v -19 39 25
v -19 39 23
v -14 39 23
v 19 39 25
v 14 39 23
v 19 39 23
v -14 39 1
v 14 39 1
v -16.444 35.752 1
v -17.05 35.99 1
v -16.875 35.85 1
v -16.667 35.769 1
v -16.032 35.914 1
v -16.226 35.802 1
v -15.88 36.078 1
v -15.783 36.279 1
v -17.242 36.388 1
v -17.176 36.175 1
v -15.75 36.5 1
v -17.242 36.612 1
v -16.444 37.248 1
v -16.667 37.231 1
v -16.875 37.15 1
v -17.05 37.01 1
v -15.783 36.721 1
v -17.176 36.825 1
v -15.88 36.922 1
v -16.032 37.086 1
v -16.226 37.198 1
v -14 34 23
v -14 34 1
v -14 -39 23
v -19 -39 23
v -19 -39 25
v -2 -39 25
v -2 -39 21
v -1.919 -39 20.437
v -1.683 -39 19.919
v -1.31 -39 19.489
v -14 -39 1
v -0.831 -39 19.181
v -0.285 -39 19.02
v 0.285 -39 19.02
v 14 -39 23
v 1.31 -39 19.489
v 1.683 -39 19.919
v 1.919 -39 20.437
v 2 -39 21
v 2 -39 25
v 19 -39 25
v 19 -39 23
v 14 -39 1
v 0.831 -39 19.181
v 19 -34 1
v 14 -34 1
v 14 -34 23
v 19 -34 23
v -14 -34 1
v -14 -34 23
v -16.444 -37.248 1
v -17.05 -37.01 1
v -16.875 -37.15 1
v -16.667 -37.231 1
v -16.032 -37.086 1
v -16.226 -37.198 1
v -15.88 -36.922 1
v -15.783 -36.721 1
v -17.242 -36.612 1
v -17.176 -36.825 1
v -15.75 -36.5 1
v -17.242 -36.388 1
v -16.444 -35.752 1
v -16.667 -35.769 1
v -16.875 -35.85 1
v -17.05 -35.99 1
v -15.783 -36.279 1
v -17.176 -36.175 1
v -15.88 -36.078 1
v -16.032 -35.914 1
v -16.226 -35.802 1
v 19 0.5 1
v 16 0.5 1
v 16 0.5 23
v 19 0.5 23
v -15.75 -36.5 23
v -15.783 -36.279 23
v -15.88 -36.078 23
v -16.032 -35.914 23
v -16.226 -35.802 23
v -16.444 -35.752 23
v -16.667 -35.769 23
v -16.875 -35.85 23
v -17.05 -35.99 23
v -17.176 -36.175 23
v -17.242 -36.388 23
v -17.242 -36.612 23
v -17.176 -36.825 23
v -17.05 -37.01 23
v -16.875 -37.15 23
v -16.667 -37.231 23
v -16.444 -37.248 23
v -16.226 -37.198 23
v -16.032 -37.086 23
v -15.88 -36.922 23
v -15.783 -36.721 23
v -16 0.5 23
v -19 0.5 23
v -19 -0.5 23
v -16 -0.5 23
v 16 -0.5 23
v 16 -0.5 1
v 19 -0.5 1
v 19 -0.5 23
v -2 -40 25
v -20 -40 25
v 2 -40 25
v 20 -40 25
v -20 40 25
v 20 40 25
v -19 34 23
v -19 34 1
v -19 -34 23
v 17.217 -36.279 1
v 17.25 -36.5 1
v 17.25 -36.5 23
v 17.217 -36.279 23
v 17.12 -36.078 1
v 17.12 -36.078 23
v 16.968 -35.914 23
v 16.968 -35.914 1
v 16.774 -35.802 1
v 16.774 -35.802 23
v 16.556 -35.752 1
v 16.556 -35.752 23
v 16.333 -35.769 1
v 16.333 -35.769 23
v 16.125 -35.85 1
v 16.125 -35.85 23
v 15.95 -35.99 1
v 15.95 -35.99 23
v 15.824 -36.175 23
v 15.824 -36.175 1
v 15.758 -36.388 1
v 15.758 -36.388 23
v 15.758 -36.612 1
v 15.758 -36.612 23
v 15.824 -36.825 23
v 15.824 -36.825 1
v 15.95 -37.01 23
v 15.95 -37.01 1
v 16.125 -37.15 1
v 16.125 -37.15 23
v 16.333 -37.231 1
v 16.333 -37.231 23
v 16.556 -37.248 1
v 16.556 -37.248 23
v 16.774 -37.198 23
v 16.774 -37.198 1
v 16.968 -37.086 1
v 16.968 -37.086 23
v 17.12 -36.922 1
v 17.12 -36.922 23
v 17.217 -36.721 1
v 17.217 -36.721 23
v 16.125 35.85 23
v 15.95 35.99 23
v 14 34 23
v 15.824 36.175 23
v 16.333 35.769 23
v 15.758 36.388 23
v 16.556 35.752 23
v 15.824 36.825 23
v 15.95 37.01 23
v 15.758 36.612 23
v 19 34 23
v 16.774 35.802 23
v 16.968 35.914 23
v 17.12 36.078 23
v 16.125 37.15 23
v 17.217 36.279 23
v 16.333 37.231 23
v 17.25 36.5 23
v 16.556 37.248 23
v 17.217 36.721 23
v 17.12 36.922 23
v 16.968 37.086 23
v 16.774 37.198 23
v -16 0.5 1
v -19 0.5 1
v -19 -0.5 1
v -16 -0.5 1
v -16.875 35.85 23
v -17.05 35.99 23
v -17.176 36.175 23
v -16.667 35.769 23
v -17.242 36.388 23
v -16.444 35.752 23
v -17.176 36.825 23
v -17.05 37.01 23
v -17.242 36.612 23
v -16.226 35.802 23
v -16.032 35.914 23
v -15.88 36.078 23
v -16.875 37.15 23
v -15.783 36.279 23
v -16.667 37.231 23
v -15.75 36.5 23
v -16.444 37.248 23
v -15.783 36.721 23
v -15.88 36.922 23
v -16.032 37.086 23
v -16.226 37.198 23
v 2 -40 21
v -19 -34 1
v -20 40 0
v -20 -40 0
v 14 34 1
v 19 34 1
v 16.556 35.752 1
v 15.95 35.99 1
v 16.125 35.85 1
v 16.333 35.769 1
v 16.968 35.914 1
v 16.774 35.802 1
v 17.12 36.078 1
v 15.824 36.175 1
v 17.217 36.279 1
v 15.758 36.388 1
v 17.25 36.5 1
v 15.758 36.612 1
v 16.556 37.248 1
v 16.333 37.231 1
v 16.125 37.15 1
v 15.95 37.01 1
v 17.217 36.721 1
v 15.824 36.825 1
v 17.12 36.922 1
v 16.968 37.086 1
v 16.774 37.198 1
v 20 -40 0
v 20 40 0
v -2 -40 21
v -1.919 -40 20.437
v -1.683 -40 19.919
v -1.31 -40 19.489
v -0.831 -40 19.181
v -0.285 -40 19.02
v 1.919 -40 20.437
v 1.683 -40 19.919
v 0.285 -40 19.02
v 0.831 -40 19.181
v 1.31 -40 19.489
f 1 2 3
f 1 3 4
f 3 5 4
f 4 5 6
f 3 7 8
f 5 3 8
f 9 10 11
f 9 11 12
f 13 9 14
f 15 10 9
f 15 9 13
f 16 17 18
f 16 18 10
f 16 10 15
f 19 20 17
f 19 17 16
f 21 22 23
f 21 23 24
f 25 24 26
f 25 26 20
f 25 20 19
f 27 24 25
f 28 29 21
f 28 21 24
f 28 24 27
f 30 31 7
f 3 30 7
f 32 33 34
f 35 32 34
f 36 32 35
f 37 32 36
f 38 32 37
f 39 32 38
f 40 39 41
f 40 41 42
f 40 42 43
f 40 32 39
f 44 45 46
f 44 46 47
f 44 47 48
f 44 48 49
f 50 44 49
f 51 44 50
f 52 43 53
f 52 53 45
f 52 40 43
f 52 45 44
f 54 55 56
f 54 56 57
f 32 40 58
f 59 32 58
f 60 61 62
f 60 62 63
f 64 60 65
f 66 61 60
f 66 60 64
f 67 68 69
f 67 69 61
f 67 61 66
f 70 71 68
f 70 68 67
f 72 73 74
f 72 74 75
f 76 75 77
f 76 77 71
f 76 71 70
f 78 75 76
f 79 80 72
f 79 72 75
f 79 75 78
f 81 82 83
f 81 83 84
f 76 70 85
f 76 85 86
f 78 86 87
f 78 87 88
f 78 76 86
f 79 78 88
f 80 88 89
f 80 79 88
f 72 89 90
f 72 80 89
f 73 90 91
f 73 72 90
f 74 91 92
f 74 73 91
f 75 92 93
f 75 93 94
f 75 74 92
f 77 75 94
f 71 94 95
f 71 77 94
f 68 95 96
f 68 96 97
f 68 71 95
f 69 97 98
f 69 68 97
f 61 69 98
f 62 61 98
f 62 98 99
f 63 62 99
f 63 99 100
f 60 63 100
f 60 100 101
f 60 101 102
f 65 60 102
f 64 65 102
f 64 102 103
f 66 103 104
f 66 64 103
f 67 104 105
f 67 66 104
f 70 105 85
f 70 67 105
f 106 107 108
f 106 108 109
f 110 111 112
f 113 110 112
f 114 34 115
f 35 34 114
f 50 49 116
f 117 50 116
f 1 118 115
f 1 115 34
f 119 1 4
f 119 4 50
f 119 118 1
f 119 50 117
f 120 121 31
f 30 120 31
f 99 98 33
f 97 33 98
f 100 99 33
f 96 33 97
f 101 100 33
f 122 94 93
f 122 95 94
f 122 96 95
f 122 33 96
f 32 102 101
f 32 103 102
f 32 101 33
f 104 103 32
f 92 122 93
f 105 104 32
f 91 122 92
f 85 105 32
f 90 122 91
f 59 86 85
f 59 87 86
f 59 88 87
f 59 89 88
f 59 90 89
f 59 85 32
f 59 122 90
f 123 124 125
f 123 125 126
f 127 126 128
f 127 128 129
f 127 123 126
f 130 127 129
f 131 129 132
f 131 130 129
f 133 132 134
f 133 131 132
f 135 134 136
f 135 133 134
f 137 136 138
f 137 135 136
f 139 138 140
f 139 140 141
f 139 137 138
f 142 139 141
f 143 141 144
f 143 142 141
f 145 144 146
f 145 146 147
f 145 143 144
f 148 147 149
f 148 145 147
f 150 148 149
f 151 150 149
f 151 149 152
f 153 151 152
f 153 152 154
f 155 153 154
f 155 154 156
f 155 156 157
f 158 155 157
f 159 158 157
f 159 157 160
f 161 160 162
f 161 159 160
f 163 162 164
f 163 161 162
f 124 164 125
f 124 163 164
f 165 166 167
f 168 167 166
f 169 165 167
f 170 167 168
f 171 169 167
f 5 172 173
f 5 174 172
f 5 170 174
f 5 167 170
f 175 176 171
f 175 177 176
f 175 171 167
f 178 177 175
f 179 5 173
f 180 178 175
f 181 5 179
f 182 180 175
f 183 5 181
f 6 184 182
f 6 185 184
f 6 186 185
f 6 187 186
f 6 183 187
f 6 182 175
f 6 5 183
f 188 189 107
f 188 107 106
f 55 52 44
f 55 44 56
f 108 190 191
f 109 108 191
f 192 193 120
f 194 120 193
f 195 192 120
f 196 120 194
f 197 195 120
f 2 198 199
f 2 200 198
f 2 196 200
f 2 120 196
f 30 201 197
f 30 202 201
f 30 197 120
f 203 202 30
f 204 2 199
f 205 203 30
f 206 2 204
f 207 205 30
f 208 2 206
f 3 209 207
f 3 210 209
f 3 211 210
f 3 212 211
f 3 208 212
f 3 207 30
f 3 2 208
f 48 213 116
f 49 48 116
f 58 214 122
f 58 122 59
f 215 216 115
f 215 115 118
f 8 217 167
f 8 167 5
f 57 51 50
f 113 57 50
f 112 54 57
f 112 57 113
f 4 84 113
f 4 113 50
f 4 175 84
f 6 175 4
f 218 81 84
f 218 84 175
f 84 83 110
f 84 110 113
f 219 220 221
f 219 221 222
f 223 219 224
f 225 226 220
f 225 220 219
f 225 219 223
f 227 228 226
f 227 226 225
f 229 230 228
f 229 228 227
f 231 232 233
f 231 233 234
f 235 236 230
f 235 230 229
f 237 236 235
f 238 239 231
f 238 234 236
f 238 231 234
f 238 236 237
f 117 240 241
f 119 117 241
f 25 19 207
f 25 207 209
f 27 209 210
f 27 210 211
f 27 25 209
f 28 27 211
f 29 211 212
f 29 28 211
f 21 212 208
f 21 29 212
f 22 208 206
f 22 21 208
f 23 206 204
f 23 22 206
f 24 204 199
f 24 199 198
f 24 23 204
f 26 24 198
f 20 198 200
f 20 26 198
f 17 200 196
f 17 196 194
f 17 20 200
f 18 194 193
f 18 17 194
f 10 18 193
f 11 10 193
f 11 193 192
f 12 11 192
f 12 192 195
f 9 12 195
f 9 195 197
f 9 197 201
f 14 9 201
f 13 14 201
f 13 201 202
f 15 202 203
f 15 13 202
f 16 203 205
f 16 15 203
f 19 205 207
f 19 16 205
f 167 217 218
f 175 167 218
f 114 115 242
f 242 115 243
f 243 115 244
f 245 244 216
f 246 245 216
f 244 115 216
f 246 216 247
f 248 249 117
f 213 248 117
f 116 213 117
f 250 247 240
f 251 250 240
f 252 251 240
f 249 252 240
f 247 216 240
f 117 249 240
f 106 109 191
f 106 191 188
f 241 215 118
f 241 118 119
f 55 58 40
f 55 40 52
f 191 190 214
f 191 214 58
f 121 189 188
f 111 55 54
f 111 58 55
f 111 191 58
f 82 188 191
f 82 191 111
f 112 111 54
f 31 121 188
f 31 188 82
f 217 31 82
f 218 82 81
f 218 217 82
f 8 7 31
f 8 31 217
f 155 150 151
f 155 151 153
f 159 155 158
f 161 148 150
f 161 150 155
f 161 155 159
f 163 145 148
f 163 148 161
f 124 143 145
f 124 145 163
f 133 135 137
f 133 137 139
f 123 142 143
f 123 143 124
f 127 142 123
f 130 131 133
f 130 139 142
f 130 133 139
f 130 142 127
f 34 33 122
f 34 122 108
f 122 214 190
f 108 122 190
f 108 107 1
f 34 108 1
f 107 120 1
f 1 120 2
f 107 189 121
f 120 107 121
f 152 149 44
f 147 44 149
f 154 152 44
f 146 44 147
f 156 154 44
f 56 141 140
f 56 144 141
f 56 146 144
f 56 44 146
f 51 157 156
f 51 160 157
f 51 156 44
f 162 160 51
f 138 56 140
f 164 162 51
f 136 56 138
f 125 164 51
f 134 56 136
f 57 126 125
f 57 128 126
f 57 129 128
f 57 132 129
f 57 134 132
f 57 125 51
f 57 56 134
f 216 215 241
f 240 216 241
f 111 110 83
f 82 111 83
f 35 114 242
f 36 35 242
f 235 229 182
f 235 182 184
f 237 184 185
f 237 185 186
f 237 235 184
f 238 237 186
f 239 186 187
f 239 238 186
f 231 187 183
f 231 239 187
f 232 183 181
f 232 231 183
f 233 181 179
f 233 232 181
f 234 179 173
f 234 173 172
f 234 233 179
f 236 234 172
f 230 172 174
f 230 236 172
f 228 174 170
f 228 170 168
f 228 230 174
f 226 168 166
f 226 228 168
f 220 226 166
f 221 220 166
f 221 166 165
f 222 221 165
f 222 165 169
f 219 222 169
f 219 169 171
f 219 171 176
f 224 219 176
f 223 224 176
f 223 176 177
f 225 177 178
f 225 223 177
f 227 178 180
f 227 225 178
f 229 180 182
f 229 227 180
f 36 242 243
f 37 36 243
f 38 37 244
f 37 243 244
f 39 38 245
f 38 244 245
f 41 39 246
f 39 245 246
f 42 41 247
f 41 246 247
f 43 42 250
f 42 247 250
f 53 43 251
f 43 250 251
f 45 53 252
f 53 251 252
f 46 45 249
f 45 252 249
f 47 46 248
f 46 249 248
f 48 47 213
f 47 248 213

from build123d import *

# Parameters (mm, degrees)
F0_W     = 40
F0_H     = 80
F1_DEPTH = 25
F2_T     = -1
F3_W     = 5
F3_H     = 5
F3_R     = 0.75
F3_W_2   = 3
F3_H_2   = 1
F4_DEPTH = 22
F6_DEPTH = 25


with BuildPart() as f1:
    # F0 (on Top) → F1 (new body)
    with BuildSketch(Plane.XY):
        Rectangle(F0_W, F0_H)
    extrude(amount=F1_DEPTH)

    # F2
    f2_openings = [f1.faces().sort_by_distance(p)[0] for p in [
        (0, 0, 25),
    ]]
    offset(amount=F2_T, openings=f2_openings)

    # F3 (on face) → F4 (join)
    with BuildSketch(Plane.XY.offset(1)):
        with Locations((-16.5, 36.5)):
            Rectangle(F3_W, F3_H)
        with Locations((-16.5, 36.5)):
            Circle(F3_R, mode=Mode.SUBTRACT)
        with Locations((-16.5, -36.5)):
            Rectangle(F3_W, F3_H)
        with Locations((-16.5, -36.5)):
            Circle(F3_R, mode=Mode.SUBTRACT)
        with Locations((16.5, 36.5)):
            Rectangle(F3_W, F3_H)
        with Locations((16.5, 36.5)):
            Circle(F3_R, mode=Mode.SUBTRACT)
        with Locations((16.5, -36.5)):
            Rectangle(F3_W, F3_H)
        with Locations((16.5, -36.5)):
            Circle(F3_R, mode=Mode.SUBTRACT)
        with Locations((-17.5, 0)):
            Rectangle(F3_W_2, F3_H_2)
        with Locations((17.5, 0)):
            Rectangle(F3_W_2, F3_H_2)
    extrude(amount=F4_DEPTH)

    # F5 (on face) → F6 (cut)
    with BuildSketch(Plane.XZ.offset(40)):
        with BuildLine():
            Line((2, 25), (-2, 25))
            Line((-2, 25), (-2, 21))
            ThreePointArc((-2, 21), (0, 19), (2, 21))
            Line((2, 21), (2, 25))
        make_face()
    extrude(amount=-F6_DEPTH, mode=Mode.SUBTRACT)


solid = f1.part
